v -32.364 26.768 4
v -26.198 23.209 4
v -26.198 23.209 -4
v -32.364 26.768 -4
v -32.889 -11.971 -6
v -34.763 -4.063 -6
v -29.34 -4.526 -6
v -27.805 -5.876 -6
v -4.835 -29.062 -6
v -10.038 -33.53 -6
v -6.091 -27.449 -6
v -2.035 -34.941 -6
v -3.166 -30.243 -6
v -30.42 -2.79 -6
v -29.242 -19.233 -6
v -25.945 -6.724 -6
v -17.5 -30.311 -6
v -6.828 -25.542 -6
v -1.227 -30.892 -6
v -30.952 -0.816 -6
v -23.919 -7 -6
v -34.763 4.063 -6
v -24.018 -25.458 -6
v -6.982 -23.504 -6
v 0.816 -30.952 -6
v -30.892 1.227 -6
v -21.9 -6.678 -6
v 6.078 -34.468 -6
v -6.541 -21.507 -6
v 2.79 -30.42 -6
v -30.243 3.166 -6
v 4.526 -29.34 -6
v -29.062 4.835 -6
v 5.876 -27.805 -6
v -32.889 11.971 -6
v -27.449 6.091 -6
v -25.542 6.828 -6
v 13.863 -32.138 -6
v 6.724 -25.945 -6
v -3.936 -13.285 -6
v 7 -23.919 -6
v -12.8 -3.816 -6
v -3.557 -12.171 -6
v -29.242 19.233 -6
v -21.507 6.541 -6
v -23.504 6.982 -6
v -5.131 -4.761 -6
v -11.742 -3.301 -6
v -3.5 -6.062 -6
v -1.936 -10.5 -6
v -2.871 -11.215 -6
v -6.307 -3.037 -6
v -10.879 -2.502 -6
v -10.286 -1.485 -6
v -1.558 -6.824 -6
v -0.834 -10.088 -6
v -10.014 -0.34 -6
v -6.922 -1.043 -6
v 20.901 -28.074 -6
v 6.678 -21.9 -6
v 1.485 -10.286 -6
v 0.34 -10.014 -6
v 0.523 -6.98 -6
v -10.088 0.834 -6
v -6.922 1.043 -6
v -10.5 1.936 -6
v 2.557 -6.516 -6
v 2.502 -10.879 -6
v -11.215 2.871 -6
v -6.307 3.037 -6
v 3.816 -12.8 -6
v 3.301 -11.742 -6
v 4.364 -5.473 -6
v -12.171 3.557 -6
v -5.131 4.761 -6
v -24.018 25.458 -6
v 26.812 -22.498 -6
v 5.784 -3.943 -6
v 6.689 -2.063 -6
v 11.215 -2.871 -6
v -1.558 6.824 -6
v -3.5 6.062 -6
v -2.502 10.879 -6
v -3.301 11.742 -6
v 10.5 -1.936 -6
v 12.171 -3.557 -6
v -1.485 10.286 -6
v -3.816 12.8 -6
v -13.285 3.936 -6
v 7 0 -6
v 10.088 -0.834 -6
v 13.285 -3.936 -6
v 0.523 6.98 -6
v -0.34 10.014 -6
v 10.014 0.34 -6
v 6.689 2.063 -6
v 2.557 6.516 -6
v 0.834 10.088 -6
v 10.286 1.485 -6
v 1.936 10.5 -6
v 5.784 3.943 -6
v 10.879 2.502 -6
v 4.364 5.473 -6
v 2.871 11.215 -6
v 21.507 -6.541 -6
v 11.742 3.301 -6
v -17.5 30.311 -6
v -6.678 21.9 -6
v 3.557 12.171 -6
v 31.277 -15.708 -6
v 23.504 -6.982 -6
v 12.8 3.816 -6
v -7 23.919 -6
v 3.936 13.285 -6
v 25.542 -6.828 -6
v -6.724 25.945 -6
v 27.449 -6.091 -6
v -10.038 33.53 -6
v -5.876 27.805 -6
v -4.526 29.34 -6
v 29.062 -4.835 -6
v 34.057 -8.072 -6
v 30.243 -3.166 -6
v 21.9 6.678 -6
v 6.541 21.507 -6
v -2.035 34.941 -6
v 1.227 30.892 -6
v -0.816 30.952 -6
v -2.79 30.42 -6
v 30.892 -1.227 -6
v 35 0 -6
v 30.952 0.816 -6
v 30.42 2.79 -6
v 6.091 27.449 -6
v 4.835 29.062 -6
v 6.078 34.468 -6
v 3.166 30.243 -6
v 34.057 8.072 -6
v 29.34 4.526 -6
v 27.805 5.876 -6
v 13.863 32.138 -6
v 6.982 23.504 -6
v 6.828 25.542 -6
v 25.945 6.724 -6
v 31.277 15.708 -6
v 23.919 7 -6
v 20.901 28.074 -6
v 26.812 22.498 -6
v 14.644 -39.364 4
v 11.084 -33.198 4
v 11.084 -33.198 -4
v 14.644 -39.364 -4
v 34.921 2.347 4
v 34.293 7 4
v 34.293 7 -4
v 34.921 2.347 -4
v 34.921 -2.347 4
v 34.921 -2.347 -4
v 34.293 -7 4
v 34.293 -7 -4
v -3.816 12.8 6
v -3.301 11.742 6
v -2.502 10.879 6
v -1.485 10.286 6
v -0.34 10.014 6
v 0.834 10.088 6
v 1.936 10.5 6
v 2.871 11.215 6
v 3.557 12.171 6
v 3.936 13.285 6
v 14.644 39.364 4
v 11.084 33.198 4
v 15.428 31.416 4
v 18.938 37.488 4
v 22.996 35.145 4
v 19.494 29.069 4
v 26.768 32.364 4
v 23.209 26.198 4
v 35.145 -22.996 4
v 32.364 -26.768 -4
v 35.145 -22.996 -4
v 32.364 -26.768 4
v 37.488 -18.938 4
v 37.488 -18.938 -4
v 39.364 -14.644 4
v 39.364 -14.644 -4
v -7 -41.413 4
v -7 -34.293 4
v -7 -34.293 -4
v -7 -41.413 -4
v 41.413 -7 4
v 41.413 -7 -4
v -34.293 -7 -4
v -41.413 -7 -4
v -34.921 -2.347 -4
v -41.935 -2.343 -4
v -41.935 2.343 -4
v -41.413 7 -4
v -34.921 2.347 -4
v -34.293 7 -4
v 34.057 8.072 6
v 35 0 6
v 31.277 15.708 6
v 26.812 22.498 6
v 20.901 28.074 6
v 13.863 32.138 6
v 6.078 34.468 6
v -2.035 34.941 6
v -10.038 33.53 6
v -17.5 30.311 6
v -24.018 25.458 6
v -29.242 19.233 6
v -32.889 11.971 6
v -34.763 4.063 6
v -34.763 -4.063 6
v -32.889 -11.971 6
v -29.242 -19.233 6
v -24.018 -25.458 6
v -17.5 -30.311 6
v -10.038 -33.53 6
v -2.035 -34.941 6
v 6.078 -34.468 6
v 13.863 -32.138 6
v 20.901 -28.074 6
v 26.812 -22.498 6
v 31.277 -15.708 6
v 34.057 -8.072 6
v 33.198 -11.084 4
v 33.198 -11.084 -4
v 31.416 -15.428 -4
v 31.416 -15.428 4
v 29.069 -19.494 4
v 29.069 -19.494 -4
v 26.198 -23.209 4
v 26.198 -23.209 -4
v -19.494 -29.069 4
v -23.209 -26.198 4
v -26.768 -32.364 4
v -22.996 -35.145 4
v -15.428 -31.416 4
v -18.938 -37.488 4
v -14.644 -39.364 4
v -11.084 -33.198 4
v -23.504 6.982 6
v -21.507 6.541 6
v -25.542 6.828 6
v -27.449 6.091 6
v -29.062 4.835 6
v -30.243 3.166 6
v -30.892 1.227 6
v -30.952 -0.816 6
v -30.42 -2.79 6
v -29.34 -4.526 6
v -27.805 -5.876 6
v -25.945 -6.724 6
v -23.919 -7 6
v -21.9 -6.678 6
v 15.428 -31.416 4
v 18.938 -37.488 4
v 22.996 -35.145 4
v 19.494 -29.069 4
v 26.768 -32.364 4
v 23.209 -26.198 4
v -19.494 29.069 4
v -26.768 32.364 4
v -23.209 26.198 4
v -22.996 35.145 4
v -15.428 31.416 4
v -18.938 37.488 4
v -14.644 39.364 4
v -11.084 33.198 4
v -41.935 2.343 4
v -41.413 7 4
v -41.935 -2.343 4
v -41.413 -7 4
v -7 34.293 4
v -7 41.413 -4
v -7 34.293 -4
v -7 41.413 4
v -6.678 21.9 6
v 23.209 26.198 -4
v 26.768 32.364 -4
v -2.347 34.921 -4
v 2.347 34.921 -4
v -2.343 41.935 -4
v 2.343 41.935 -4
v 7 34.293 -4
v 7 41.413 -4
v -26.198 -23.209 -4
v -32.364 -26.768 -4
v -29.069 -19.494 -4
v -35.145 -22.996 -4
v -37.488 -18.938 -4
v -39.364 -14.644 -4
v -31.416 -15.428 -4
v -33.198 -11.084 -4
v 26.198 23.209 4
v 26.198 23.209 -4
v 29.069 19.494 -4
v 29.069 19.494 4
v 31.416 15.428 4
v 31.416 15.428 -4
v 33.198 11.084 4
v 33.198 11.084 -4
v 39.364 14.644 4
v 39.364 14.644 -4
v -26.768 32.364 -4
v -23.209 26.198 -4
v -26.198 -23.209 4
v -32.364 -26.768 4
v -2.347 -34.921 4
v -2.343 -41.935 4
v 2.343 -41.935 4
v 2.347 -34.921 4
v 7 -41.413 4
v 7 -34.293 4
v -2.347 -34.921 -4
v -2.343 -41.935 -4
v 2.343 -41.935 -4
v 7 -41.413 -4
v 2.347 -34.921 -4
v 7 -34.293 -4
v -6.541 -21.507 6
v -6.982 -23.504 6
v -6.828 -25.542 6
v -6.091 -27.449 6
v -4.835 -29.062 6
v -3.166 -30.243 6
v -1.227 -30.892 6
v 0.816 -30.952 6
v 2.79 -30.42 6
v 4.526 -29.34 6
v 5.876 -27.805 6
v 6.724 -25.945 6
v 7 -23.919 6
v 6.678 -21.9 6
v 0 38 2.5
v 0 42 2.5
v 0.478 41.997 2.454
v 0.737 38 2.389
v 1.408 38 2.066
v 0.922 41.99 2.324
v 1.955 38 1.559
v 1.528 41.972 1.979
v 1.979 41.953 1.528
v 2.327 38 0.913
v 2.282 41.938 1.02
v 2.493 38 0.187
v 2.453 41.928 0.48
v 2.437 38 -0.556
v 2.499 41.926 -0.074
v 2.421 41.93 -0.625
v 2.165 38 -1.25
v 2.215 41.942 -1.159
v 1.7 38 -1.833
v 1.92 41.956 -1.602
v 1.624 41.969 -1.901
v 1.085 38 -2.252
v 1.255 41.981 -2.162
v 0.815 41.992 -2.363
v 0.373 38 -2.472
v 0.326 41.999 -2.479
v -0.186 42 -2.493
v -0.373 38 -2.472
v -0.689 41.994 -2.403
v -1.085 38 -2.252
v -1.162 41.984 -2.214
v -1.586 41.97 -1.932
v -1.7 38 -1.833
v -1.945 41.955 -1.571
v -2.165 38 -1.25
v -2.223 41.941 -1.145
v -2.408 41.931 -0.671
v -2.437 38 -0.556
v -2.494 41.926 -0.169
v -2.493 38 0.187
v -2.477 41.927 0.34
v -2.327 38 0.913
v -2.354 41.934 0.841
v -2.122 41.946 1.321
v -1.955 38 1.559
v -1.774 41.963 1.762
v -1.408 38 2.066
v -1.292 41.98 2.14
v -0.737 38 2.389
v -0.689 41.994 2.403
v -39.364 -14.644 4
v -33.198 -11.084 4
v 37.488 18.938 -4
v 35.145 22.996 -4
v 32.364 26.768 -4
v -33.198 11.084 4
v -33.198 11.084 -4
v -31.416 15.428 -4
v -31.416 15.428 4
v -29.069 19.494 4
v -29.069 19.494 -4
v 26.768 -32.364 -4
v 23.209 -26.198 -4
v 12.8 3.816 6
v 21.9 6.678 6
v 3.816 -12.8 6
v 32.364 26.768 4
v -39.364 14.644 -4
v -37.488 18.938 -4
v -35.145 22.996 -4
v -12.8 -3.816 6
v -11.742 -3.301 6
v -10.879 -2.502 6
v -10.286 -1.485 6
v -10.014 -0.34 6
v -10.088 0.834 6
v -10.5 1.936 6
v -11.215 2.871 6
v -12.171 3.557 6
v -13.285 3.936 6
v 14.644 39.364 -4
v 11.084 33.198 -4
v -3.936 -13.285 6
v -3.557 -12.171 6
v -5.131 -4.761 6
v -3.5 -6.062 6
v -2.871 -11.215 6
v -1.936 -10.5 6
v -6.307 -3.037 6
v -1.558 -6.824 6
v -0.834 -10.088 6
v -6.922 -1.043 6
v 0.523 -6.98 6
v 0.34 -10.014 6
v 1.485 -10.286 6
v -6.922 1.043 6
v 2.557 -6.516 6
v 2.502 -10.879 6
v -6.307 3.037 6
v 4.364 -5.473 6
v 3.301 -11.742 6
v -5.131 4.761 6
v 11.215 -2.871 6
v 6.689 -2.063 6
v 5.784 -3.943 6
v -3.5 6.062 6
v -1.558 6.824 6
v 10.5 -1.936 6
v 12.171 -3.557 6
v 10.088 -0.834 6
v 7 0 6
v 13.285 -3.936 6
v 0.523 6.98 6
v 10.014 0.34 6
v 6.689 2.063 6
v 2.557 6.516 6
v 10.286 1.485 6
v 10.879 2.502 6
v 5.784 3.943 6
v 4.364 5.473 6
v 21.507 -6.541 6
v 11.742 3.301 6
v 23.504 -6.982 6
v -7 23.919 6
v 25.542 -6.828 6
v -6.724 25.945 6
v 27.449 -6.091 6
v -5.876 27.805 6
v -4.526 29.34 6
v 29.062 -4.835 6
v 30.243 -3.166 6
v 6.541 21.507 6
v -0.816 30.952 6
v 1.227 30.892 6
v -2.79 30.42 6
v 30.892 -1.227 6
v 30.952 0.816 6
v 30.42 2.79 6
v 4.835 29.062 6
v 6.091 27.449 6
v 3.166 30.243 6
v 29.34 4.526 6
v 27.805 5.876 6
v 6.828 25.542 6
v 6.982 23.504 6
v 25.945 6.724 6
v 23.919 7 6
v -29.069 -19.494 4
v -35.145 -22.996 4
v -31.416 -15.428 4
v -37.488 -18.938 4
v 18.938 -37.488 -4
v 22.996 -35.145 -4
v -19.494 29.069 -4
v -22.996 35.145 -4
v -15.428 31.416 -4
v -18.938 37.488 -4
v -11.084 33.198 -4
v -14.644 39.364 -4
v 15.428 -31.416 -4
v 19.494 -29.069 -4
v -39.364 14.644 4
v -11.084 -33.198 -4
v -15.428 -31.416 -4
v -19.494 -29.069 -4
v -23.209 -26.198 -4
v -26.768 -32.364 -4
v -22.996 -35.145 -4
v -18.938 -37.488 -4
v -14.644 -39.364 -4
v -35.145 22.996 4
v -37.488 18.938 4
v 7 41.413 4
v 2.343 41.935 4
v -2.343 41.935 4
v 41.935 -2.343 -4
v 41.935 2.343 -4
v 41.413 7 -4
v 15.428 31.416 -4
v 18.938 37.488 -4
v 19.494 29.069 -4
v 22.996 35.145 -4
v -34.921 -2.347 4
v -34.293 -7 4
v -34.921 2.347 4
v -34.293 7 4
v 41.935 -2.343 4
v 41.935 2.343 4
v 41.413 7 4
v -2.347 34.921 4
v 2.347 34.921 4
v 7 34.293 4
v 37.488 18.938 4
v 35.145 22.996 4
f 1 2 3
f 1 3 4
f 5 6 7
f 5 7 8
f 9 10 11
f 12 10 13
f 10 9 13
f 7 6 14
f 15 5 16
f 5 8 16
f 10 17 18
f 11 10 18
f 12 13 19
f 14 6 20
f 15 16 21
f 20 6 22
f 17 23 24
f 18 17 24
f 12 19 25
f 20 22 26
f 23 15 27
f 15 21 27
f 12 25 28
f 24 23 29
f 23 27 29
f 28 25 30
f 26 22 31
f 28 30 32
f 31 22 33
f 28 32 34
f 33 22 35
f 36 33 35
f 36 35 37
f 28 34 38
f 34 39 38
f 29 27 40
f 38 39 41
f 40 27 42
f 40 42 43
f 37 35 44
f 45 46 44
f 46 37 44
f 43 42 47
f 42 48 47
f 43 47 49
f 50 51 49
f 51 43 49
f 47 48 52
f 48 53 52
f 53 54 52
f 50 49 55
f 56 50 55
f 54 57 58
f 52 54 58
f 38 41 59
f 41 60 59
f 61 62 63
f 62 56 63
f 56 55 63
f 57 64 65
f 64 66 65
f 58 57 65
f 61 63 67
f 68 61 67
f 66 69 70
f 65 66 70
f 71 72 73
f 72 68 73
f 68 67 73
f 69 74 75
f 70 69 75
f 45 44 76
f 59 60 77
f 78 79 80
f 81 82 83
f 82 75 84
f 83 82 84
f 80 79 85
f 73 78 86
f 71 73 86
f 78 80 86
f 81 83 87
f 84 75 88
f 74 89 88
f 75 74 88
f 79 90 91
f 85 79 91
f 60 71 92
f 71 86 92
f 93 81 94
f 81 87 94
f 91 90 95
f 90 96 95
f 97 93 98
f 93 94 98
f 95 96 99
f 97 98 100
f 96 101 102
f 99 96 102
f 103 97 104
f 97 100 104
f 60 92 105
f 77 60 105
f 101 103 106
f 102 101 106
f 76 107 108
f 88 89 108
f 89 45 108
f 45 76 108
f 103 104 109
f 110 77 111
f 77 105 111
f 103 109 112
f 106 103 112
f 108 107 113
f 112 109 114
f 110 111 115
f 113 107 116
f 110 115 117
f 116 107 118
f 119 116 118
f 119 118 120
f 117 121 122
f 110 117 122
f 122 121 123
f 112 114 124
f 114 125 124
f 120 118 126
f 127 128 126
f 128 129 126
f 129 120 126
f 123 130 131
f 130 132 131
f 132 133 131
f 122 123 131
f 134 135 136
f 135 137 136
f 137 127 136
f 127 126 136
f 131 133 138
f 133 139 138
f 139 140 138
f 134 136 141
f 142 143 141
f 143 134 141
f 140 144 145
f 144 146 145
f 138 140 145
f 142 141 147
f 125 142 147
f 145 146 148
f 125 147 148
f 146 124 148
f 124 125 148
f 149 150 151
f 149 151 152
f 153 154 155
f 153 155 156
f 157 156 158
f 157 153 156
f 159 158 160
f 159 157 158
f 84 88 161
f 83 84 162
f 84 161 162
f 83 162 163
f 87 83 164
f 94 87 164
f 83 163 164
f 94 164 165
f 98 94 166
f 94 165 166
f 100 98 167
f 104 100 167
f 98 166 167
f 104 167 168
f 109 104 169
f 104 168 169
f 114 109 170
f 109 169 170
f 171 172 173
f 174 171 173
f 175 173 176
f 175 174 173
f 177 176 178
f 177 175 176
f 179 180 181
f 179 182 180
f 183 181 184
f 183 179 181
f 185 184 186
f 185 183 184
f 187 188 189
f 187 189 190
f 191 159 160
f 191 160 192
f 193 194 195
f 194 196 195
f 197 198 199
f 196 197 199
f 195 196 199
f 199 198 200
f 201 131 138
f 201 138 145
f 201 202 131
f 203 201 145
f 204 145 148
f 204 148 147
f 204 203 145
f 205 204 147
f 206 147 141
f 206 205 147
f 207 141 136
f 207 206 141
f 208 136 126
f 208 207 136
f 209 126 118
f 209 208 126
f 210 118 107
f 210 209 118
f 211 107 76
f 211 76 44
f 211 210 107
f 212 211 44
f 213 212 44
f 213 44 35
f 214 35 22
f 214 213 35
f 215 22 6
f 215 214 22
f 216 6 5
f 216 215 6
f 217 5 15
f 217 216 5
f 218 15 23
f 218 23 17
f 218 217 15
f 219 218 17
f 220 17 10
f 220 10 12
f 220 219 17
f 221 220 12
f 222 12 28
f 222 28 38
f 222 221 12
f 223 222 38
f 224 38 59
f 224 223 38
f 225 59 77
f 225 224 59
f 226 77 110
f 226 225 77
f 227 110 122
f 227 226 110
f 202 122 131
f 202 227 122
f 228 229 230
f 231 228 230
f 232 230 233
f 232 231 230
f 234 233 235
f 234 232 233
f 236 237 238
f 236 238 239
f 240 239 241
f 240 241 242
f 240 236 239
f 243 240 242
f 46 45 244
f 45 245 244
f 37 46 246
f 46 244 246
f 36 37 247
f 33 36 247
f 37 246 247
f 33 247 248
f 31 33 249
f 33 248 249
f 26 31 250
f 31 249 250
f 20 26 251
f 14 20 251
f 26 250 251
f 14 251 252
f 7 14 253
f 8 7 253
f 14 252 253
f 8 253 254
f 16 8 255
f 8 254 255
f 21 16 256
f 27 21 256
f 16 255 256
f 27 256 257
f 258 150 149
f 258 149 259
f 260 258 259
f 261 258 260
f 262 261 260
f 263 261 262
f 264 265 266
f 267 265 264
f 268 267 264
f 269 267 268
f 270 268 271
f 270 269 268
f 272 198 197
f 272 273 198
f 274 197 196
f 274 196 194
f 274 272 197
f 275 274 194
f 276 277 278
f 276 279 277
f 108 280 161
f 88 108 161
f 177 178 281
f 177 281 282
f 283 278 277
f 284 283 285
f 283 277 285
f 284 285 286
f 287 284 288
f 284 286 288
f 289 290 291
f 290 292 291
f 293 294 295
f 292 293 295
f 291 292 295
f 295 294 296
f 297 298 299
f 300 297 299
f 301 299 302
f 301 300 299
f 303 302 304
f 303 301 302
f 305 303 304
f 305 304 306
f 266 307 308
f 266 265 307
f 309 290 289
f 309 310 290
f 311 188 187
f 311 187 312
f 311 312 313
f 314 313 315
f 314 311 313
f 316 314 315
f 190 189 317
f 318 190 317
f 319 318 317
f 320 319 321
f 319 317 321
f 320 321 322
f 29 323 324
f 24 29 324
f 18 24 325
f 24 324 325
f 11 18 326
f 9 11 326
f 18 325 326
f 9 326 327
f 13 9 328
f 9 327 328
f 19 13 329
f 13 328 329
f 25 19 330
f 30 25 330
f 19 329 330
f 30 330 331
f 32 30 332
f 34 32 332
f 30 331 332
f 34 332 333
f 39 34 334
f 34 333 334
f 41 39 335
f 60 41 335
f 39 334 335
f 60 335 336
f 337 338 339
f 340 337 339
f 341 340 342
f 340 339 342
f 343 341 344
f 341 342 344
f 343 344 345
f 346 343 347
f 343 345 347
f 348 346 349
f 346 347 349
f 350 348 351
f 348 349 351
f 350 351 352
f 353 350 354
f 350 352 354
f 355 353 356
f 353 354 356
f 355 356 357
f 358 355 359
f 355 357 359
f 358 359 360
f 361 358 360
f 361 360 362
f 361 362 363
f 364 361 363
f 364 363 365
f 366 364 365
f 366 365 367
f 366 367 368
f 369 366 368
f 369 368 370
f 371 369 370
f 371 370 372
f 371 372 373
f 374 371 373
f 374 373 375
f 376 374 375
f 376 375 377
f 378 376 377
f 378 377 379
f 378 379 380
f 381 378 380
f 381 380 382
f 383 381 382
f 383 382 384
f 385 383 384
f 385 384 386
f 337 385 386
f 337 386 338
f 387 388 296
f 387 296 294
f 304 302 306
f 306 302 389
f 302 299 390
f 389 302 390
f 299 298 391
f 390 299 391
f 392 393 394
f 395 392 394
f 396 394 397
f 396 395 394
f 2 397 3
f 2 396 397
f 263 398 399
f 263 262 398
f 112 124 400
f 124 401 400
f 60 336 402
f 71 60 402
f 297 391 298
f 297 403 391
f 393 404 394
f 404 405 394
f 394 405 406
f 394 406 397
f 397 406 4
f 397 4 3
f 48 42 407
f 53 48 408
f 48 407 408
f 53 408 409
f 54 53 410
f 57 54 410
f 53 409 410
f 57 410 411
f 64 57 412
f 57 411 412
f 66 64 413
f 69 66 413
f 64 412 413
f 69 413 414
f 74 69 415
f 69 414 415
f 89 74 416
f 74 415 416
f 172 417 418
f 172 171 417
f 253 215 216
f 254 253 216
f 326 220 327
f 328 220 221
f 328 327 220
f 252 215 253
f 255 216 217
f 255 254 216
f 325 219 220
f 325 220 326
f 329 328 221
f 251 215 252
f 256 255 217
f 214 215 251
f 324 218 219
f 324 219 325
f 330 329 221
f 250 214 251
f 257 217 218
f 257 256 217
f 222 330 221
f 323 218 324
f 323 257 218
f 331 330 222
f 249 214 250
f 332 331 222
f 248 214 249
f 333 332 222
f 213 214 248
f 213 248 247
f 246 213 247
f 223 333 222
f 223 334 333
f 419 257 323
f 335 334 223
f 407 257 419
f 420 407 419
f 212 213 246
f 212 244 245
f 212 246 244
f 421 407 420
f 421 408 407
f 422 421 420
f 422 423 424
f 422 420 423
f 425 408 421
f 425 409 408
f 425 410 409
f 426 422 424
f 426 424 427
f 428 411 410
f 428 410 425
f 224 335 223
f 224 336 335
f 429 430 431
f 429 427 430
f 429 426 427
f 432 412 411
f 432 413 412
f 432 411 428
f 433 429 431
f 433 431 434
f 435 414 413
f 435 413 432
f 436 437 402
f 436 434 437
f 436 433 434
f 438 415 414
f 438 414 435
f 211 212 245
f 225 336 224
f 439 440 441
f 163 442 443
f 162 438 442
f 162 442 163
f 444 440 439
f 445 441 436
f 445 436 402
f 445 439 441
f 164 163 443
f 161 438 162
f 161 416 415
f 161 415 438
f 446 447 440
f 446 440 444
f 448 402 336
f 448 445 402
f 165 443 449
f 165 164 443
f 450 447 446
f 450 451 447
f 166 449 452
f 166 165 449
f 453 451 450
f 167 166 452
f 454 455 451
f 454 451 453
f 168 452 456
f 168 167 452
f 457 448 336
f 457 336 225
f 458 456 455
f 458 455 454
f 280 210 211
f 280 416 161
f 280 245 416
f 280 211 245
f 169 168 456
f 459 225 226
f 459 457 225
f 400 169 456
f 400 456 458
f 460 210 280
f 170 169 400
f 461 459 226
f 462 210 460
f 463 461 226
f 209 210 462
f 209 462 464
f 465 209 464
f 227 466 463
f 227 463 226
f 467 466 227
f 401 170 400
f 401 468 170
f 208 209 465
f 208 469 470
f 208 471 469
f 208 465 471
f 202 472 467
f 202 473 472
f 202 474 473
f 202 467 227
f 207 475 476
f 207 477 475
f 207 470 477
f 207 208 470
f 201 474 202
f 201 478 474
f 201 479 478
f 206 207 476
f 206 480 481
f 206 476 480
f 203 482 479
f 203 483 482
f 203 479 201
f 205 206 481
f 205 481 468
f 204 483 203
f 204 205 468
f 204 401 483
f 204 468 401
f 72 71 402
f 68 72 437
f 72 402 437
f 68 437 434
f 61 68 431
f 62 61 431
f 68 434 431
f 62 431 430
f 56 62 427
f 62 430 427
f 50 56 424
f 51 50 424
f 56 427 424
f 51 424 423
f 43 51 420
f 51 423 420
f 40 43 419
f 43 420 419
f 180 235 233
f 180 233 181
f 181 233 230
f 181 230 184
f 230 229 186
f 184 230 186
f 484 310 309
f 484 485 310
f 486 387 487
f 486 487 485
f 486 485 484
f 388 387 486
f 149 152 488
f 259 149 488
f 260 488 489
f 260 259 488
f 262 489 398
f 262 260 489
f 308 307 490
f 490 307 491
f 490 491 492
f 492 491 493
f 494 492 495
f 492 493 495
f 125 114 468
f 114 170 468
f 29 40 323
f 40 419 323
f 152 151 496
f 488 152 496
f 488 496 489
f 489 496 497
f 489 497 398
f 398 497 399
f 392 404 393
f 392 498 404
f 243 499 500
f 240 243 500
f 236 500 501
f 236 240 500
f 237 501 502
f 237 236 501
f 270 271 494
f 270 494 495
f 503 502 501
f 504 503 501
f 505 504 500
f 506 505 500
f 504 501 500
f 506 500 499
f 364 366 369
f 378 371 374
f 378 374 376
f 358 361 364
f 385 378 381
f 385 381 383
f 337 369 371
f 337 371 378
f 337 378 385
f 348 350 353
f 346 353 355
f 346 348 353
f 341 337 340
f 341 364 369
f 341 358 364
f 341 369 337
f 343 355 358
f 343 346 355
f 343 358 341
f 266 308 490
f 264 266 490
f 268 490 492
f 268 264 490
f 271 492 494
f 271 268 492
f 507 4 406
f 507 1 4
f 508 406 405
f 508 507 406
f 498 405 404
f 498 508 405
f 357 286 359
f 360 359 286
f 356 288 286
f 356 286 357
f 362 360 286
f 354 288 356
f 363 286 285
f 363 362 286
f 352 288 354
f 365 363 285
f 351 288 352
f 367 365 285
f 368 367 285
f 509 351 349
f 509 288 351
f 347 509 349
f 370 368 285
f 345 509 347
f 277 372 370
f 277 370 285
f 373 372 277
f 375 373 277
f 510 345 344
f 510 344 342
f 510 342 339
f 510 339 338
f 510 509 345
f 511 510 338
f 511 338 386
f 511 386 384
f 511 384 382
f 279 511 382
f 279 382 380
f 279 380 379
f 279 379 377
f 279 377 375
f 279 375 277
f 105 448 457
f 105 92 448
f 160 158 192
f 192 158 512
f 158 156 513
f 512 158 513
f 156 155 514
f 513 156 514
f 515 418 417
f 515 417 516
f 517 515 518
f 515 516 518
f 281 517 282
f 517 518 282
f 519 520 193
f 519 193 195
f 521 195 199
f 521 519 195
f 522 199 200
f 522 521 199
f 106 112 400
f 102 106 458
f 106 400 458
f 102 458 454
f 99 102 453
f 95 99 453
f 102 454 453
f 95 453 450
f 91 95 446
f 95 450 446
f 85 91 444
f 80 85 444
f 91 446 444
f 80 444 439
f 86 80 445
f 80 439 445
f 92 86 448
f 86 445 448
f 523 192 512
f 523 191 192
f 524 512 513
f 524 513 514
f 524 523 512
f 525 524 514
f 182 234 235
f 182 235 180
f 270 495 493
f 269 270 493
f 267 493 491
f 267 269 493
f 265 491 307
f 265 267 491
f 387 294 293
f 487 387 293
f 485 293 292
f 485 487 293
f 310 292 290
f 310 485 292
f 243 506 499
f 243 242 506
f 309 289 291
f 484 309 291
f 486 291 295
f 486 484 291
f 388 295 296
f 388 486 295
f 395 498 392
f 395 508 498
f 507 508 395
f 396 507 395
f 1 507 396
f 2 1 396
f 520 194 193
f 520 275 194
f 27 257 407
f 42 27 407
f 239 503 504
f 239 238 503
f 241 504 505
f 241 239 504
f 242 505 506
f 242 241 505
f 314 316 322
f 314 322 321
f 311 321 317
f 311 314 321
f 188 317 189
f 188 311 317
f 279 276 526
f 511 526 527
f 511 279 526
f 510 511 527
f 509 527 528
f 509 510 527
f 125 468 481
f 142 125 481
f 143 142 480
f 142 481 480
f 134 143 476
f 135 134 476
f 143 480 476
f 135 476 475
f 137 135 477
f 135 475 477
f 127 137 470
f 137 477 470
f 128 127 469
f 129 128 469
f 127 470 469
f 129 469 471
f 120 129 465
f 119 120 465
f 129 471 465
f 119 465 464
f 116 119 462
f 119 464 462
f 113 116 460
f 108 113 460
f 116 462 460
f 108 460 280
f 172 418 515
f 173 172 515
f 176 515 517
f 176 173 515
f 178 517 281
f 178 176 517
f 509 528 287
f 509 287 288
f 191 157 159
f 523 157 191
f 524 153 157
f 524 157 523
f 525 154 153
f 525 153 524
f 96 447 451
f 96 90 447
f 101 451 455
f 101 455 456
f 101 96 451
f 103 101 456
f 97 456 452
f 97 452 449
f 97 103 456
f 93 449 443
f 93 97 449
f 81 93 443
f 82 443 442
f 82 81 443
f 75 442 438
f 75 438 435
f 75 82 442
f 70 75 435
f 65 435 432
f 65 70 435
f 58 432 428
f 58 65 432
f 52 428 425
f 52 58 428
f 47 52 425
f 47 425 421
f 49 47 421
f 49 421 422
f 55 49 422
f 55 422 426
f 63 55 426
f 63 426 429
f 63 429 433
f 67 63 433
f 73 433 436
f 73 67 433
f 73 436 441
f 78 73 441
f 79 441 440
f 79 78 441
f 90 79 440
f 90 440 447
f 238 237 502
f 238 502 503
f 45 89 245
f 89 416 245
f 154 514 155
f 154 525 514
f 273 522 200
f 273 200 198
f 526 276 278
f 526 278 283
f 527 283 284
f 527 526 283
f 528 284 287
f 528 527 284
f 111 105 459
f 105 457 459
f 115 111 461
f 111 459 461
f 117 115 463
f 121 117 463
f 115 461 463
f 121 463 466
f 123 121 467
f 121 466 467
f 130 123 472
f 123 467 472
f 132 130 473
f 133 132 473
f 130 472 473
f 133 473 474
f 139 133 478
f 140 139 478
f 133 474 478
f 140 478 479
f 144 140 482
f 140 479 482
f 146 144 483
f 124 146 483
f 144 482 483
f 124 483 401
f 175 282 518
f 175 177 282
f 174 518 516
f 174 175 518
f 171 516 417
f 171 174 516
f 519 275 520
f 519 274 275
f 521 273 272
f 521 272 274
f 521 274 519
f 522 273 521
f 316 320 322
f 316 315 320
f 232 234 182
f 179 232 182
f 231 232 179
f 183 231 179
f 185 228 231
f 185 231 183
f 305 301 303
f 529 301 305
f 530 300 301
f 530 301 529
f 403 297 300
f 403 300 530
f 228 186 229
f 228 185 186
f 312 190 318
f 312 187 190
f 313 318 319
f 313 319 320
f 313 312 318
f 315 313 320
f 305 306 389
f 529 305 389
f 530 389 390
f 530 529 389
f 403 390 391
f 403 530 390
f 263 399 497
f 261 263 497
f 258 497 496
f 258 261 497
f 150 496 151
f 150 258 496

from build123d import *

# Parameters (mm, degrees)
CROQUIS1_R                 = 35
CROQUIS1_R_2               = 7
SALIENTE_EXTRUIR1_DEPTH    = 6
SALIENTE_EXTRUIR2_DEPTH    = 4
SALIENTE_EXTRUIR2_2_DEPTH  = 4
SALIENTE_EXTRUIR2_3_DEPTH  = 4
SALIENTE_EXTRUIR2_4_DEPTH  = 4
SALIENTE_EXTRUIR2_5_DEPTH  = 4
SALIENTE_EXTRUIR2_6_DEPTH  = 4
SALIENTE_EXTRUIR2_7_DEPTH  = 4
SALIENTE_EXTRUIR2_8_DEPTH  = 4
SALIENTE_EXTRUIR2_9_DEPTH  = 4
SALIENTE_EXTRUIR2_10_DEPTH = 4
SALIENTE_EXTRUIR2_11_DEPTH = 4
SALIENTE_EXTRUIR2_12_DEPTH = 4
CROQUIS7_R                 = 2.5
CORTAR_EXTRUIR3_DEPTH      = 4


with BuildPart() as part:
    # Croquis1 → Saliente-Extruir1 (new, symmetric)
    with BuildSketch(Plane.XY):
        Circle(CROQUIS1_R)
        Circle(CROQUIS1_R_2, mode=Mode.SUBTRACT)
        with BuildLine():
            Line((-6.67757441, 21.9), (-3.815756806, 12.8))
            ThreePointArc((-3.815756806, 12.8), (0.249710926, 10.007802052), (3.935549423, 13.284842156))
            Line((3.935549423, 13.284842156), (6.541207042, 21.507489131))
            ThreePointArc((6.541207042, 21.507489131), (0.207762389, 30.996916091), (-6.67757441, 21.9))
        make_face(mode=Mode.SUBTRACT)
        with BuildLine():
            Line((21.9, 6.67757441), (12.8, 3.815756806))
            ThreePointArc((12.8, 3.815756806), (10.007802052, -0.249710926), (13.284842156, -3.935549423))
            Line((13.284842156, -3.935549423), (21.507489131, -6.541207042))
            ThreePointArc((21.507489131, -6.541207042), (30.996916091, -0.207762389), (21.9, 6.67757441))
        make_face(mode=Mode.SUBTRACT)
        with BuildLine():
            Line((6.67757441, -21.9), (3.815756806, -12.8))
            ThreePointArc((3.815756806, -12.8), (-0.249710926, -10.007802052), (-3.935549423, -13.284842156))
            Line((-3.935549423, -13.284842156), (-6.541207042, -21.507489131))
            ThreePointArc((-6.541207042, -21.507489131), (-0.207762389, -30.996916091), (6.67757441, -21.9))
        make_face(mode=Mode.SUBTRACT)
        with BuildLine():
            Line((-21.9, -6.67757441), (-12.8, -3.815756806))
            ThreePointArc((-12.8, -3.815756806), (-10.007802052, 0.249710926), (-13.284842156, 3.935549423))
            Line((-13.284842156, 3.935549423), (-21.507489131, 6.541207042))
            ThreePointArc((-21.507489131, 6.541207042), (-30.996916091, 0.207762389), (-21.9, -6.67757441))
        make_face(mode=Mode.SUBTRACT)
    extrude(amount=SALIENTE_EXTRUIR1_DEPTH, both=True)


with BuildPart() as body_2:
    # Croquis4 → Saliente-Extruir2 (new, symmetric)
    with BuildSketch(Plane.XY):
        with BuildLine():
            Line((-7, 41.412558482), (-7, 34.292856399))
            ThreePointArc((-7, 34.292856399), (0, 35), (7, 34.292856399))
            Line((7, 34.292856399), (7, 41.412558482))
            ThreePointArc((7, 41.412558482), (0, 42), (-7, 41.412558482))
        make_face()
    extrude(amount=SALIENTE_EXTRUIR2_DEPTH, both=True)

    # Croquis7 → Cortar-Extruir3 (cut)
    with BuildSketch(Plane(origin=(0, 42, 0), x_dir=(1, 0, 0), z_dir=(0, 1, 0))):
        with Locations(Location((0, 0, 0), (0, 0, 270))):
            Circle(CROQUIS7_R)
    extrude(amount=-CORTAR_EXTRUIR3_DEPTH, mode=Mode.SUBTRACT)


with BuildPart() as body_3:
    # Croquis4 → Saliente-Extruir2 2 (new, symmetric)
    with BuildSketch(Plane.XY):
        with BuildLine():
            Line((14.644101414, 39.364327681), (11.084250373, 33.19848481))
            ThreePointArc((11.084250373, 33.19848481), (17.5, 30.310889132), (23.208606026, 26.19848481))
            Line((23.208606026, 26.19848481), (26.768457067, 32.364327681))
            ThreePointArc((26.768457067, 32.364327681), (21, 36.373066959), (14.644101414, 39.364327681))
        make_face()
    extrude(amount=SALIENTE_EXTRUIR2_2_DEPTH, both=True)


with BuildPart() as body_4:
    # Croquis4 → Saliente-Extruir2 3 (new, symmetric)
    with BuildSketch(Plane.XY):
        with BuildLine():
            Line((32.364327681, 26.768457067), (26.19848481, 23.208606026))
            ThreePointArc((26.19848481, 23.208606026), (30.310889132, 17.5), (33.19848481, 11.084250373))
            Line((33.19848481, 11.084250373), (39.364327681, 14.644101414))
            ThreePointArc((39.364327681, 14.644101414), (36.373066959, 21), (32.364327681, 26.768457067))
        make_face()
    extrude(amount=SALIENTE_EXTRUIR2_3_DEPTH, both=True)


with BuildPart() as body_5:
    # Croquis4 → Saliente-Extruir2 4 (new, symmetric)
    with BuildSketch(Plane.XY):
        with BuildLine():
            Line((41.412558482, 7), (34.292856399, 7))
            ThreePointArc((34.292856399, 7), (35, 0), (34.292856399, -7))
            Line((34.292856399, -7), (41.412558482, -7))
            ThreePointArc((41.412558482, -7), (42, 0), (41.412558482, 7))
        make_face()
    extrude(amount=SALIENTE_EXTRUIR2_4_DEPTH, both=True)


with BuildPart() as body_6:
    # Croquis4 → Saliente-Extruir2 5 (new, symmetric)
    with BuildSketch(Plane.XY):
        with BuildLine():
            Line((39.364327681, -14.644101414), (33.19848481, -11.084250373))
            ThreePointArc((33.19848481, -11.084250373), (30.310889132, -17.5), (26.19848481, -23.208606026))
            Line((26.19848481, -23.208606026), (32.364327681, -26.768457067))
            ThreePointArc((32.364327681, -26.768457067), (36.373066959, -21), (39.364327681, -14.644101414))
        make_face()
    extrude(amount=SALIENTE_EXTRUIR2_5_DEPTH, both=True)


with BuildPart() as body_7:
    # Croquis4 → Saliente-Extruir2 6 (new, symmetric)
    with BuildSketch(Plane.XY):
        with BuildLine():
            Line((26.768457067, -32.364327681), (23.208606026, -26.19848481))
            ThreePointArc((23.208606026, -26.19848481), (17.5, -30.310889132), (11.084250373, -33.19848481))
            Line((11.084250373, -33.19848481), (14.644101414, -39.364327681))
            ThreePointArc((14.644101414, -39.364327681), (21, -36.373066959), (26.768457067, -32.364327681))
        make_face()
    extrude(amount=SALIENTE_EXTRUIR2_6_DEPTH, both=True)


with BuildPart() as body_8:
    # Croquis4 → Saliente-Extruir2 7 (new, symmetric)
    with BuildSketch(Plane.XY):
        with BuildLine():
            Line((7, -41.412558482), (7, -34.292856399))
            ThreePointArc((7, -34.292856399), (0, -35), (-7, -34.292856399))
            Line((-7, -34.292856399), (-7, -41.412558482))
            ThreePointArc((-7, -41.412558482), (0, -42), (7, -41.412558482))
        make_face()
    extrude(amount=SALIENTE_EXTRUIR2_7_DEPTH, both=True)


with BuildPart() as body_9:
    # Croquis4 → Saliente-Extruir2 8 (new, symmetric)
    with BuildSketch(Plane.XY):
        with BuildLine():
            Line((-14.644101414, -39.364327681), (-11.084250373, -33.19848481))
            ThreePointArc((-11.084250373, -33.19848481), (-17.5, -30.310889132), (-23.208606026, -26.19848481))
            Line((-23.208606026, -26.19848481), (-26.768457067, -32.364327681))
            ThreePointArc((-26.768457067, -32.364327681), (-21, -36.373066959), (-14.644101414, -39.364327681))
        make_face()
    extrude(amount=SALIENTE_EXTRUIR2_8_DEPTH, both=True)


with BuildPart() as body_10:
    # Croquis4 → Saliente-Extruir2 9 (new, symmetric)
    with BuildSketch(Plane.XY):
        with BuildLine():
            Line((-32.364327681, -26.768457067), (-26.19848481, -23.208606026))
            ThreePointArc((-26.19848481, -23.208606026), (-30.310889132, -17.5), (-33.19848481, -11.084250373))
            Line((-33.19848481, -11.084250373), (-39.364327681, -14.644101414))
            ThreePointArc((-39.364327681, -14.644101414), (-36.373066959, -21), (-32.364327681, -26.768457067))
        make_face()
    extrude(amount=SALIENTE_EXTRUIR2_9_DEPTH, both=True)


with BuildPart() as body_11:
    # Croquis4 → Saliente-Extruir2 10 (new, symmetric)
    with BuildSketch(Plane.XY):
        with BuildLine():
            Line((-41.412558482, -7), (-34.292856399, -7))
            ThreePointArc((-34.292856399, -7), (-35, 0), (-34.292856399, 7))
            Line((-34.292856399, 7), (-41.412558482, 7))
            ThreePointArc((-41.412558482, 7), (-42, 0), (-41.412558482, -7))
        make_face()
    extrude(amount=SALIENTE_EXTRUIR2_10_DEPTH, both=True)


with BuildPart() as body_12:
    # Croquis4 → Saliente-Extruir2 11 (new, symmetric)
    with BuildSketch(Plane.XY):
        with BuildLine():
            Line((-39.364327681, 14.644101414), (-33.19848481, 11.084250373))
            ThreePointArc((-33.19848481, 11.084250373), (-30.310889132, 17.5), (-26.19848481, 23.208606026))
            Line((-26.19848481, 23.208606026), (-32.364327681, 26.768457067))
            ThreePointArc((-32.364327681, 26.768457067), (-36.373066959, 21), (-39.364327681, 14.644101414))
        make_face()
    extrude(amount=SALIENTE_EXTRUIR2_11_DEPTH, both=True)


with BuildPart() as body_13:
    # Croquis4 → Saliente-Extruir2 12 (new, symmetric)
    with BuildSketch(Plane.XY):
        with BuildLine():
            Line((-26.768457067, 32.364327681), (-23.208606026, 26.19848481))
            ThreePointArc((-23.208606026, 26.19848481), (-17.5, 30.310889132), (-11.084250373, 33.19848481))
            Line((-11.084250373, 33.19848481), (-14.644101414, 39.364327681))
            ThreePointArc((-14.644101414, 39.364327681), (-21, 36.373066959), (-26.768457067, 32.364327681))
        make_face()
    extrude(amount=SALIENTE_EXTRUIR2_12_DEPTH, both=True)


solid = Compound([part.part, body_2.part, body_3.part, body_4.part, body_5.part, body_6.part, body_7.part, body_8.part, body_9.part, body_10.part, body_11.part, body_12.part, body_13.part])
